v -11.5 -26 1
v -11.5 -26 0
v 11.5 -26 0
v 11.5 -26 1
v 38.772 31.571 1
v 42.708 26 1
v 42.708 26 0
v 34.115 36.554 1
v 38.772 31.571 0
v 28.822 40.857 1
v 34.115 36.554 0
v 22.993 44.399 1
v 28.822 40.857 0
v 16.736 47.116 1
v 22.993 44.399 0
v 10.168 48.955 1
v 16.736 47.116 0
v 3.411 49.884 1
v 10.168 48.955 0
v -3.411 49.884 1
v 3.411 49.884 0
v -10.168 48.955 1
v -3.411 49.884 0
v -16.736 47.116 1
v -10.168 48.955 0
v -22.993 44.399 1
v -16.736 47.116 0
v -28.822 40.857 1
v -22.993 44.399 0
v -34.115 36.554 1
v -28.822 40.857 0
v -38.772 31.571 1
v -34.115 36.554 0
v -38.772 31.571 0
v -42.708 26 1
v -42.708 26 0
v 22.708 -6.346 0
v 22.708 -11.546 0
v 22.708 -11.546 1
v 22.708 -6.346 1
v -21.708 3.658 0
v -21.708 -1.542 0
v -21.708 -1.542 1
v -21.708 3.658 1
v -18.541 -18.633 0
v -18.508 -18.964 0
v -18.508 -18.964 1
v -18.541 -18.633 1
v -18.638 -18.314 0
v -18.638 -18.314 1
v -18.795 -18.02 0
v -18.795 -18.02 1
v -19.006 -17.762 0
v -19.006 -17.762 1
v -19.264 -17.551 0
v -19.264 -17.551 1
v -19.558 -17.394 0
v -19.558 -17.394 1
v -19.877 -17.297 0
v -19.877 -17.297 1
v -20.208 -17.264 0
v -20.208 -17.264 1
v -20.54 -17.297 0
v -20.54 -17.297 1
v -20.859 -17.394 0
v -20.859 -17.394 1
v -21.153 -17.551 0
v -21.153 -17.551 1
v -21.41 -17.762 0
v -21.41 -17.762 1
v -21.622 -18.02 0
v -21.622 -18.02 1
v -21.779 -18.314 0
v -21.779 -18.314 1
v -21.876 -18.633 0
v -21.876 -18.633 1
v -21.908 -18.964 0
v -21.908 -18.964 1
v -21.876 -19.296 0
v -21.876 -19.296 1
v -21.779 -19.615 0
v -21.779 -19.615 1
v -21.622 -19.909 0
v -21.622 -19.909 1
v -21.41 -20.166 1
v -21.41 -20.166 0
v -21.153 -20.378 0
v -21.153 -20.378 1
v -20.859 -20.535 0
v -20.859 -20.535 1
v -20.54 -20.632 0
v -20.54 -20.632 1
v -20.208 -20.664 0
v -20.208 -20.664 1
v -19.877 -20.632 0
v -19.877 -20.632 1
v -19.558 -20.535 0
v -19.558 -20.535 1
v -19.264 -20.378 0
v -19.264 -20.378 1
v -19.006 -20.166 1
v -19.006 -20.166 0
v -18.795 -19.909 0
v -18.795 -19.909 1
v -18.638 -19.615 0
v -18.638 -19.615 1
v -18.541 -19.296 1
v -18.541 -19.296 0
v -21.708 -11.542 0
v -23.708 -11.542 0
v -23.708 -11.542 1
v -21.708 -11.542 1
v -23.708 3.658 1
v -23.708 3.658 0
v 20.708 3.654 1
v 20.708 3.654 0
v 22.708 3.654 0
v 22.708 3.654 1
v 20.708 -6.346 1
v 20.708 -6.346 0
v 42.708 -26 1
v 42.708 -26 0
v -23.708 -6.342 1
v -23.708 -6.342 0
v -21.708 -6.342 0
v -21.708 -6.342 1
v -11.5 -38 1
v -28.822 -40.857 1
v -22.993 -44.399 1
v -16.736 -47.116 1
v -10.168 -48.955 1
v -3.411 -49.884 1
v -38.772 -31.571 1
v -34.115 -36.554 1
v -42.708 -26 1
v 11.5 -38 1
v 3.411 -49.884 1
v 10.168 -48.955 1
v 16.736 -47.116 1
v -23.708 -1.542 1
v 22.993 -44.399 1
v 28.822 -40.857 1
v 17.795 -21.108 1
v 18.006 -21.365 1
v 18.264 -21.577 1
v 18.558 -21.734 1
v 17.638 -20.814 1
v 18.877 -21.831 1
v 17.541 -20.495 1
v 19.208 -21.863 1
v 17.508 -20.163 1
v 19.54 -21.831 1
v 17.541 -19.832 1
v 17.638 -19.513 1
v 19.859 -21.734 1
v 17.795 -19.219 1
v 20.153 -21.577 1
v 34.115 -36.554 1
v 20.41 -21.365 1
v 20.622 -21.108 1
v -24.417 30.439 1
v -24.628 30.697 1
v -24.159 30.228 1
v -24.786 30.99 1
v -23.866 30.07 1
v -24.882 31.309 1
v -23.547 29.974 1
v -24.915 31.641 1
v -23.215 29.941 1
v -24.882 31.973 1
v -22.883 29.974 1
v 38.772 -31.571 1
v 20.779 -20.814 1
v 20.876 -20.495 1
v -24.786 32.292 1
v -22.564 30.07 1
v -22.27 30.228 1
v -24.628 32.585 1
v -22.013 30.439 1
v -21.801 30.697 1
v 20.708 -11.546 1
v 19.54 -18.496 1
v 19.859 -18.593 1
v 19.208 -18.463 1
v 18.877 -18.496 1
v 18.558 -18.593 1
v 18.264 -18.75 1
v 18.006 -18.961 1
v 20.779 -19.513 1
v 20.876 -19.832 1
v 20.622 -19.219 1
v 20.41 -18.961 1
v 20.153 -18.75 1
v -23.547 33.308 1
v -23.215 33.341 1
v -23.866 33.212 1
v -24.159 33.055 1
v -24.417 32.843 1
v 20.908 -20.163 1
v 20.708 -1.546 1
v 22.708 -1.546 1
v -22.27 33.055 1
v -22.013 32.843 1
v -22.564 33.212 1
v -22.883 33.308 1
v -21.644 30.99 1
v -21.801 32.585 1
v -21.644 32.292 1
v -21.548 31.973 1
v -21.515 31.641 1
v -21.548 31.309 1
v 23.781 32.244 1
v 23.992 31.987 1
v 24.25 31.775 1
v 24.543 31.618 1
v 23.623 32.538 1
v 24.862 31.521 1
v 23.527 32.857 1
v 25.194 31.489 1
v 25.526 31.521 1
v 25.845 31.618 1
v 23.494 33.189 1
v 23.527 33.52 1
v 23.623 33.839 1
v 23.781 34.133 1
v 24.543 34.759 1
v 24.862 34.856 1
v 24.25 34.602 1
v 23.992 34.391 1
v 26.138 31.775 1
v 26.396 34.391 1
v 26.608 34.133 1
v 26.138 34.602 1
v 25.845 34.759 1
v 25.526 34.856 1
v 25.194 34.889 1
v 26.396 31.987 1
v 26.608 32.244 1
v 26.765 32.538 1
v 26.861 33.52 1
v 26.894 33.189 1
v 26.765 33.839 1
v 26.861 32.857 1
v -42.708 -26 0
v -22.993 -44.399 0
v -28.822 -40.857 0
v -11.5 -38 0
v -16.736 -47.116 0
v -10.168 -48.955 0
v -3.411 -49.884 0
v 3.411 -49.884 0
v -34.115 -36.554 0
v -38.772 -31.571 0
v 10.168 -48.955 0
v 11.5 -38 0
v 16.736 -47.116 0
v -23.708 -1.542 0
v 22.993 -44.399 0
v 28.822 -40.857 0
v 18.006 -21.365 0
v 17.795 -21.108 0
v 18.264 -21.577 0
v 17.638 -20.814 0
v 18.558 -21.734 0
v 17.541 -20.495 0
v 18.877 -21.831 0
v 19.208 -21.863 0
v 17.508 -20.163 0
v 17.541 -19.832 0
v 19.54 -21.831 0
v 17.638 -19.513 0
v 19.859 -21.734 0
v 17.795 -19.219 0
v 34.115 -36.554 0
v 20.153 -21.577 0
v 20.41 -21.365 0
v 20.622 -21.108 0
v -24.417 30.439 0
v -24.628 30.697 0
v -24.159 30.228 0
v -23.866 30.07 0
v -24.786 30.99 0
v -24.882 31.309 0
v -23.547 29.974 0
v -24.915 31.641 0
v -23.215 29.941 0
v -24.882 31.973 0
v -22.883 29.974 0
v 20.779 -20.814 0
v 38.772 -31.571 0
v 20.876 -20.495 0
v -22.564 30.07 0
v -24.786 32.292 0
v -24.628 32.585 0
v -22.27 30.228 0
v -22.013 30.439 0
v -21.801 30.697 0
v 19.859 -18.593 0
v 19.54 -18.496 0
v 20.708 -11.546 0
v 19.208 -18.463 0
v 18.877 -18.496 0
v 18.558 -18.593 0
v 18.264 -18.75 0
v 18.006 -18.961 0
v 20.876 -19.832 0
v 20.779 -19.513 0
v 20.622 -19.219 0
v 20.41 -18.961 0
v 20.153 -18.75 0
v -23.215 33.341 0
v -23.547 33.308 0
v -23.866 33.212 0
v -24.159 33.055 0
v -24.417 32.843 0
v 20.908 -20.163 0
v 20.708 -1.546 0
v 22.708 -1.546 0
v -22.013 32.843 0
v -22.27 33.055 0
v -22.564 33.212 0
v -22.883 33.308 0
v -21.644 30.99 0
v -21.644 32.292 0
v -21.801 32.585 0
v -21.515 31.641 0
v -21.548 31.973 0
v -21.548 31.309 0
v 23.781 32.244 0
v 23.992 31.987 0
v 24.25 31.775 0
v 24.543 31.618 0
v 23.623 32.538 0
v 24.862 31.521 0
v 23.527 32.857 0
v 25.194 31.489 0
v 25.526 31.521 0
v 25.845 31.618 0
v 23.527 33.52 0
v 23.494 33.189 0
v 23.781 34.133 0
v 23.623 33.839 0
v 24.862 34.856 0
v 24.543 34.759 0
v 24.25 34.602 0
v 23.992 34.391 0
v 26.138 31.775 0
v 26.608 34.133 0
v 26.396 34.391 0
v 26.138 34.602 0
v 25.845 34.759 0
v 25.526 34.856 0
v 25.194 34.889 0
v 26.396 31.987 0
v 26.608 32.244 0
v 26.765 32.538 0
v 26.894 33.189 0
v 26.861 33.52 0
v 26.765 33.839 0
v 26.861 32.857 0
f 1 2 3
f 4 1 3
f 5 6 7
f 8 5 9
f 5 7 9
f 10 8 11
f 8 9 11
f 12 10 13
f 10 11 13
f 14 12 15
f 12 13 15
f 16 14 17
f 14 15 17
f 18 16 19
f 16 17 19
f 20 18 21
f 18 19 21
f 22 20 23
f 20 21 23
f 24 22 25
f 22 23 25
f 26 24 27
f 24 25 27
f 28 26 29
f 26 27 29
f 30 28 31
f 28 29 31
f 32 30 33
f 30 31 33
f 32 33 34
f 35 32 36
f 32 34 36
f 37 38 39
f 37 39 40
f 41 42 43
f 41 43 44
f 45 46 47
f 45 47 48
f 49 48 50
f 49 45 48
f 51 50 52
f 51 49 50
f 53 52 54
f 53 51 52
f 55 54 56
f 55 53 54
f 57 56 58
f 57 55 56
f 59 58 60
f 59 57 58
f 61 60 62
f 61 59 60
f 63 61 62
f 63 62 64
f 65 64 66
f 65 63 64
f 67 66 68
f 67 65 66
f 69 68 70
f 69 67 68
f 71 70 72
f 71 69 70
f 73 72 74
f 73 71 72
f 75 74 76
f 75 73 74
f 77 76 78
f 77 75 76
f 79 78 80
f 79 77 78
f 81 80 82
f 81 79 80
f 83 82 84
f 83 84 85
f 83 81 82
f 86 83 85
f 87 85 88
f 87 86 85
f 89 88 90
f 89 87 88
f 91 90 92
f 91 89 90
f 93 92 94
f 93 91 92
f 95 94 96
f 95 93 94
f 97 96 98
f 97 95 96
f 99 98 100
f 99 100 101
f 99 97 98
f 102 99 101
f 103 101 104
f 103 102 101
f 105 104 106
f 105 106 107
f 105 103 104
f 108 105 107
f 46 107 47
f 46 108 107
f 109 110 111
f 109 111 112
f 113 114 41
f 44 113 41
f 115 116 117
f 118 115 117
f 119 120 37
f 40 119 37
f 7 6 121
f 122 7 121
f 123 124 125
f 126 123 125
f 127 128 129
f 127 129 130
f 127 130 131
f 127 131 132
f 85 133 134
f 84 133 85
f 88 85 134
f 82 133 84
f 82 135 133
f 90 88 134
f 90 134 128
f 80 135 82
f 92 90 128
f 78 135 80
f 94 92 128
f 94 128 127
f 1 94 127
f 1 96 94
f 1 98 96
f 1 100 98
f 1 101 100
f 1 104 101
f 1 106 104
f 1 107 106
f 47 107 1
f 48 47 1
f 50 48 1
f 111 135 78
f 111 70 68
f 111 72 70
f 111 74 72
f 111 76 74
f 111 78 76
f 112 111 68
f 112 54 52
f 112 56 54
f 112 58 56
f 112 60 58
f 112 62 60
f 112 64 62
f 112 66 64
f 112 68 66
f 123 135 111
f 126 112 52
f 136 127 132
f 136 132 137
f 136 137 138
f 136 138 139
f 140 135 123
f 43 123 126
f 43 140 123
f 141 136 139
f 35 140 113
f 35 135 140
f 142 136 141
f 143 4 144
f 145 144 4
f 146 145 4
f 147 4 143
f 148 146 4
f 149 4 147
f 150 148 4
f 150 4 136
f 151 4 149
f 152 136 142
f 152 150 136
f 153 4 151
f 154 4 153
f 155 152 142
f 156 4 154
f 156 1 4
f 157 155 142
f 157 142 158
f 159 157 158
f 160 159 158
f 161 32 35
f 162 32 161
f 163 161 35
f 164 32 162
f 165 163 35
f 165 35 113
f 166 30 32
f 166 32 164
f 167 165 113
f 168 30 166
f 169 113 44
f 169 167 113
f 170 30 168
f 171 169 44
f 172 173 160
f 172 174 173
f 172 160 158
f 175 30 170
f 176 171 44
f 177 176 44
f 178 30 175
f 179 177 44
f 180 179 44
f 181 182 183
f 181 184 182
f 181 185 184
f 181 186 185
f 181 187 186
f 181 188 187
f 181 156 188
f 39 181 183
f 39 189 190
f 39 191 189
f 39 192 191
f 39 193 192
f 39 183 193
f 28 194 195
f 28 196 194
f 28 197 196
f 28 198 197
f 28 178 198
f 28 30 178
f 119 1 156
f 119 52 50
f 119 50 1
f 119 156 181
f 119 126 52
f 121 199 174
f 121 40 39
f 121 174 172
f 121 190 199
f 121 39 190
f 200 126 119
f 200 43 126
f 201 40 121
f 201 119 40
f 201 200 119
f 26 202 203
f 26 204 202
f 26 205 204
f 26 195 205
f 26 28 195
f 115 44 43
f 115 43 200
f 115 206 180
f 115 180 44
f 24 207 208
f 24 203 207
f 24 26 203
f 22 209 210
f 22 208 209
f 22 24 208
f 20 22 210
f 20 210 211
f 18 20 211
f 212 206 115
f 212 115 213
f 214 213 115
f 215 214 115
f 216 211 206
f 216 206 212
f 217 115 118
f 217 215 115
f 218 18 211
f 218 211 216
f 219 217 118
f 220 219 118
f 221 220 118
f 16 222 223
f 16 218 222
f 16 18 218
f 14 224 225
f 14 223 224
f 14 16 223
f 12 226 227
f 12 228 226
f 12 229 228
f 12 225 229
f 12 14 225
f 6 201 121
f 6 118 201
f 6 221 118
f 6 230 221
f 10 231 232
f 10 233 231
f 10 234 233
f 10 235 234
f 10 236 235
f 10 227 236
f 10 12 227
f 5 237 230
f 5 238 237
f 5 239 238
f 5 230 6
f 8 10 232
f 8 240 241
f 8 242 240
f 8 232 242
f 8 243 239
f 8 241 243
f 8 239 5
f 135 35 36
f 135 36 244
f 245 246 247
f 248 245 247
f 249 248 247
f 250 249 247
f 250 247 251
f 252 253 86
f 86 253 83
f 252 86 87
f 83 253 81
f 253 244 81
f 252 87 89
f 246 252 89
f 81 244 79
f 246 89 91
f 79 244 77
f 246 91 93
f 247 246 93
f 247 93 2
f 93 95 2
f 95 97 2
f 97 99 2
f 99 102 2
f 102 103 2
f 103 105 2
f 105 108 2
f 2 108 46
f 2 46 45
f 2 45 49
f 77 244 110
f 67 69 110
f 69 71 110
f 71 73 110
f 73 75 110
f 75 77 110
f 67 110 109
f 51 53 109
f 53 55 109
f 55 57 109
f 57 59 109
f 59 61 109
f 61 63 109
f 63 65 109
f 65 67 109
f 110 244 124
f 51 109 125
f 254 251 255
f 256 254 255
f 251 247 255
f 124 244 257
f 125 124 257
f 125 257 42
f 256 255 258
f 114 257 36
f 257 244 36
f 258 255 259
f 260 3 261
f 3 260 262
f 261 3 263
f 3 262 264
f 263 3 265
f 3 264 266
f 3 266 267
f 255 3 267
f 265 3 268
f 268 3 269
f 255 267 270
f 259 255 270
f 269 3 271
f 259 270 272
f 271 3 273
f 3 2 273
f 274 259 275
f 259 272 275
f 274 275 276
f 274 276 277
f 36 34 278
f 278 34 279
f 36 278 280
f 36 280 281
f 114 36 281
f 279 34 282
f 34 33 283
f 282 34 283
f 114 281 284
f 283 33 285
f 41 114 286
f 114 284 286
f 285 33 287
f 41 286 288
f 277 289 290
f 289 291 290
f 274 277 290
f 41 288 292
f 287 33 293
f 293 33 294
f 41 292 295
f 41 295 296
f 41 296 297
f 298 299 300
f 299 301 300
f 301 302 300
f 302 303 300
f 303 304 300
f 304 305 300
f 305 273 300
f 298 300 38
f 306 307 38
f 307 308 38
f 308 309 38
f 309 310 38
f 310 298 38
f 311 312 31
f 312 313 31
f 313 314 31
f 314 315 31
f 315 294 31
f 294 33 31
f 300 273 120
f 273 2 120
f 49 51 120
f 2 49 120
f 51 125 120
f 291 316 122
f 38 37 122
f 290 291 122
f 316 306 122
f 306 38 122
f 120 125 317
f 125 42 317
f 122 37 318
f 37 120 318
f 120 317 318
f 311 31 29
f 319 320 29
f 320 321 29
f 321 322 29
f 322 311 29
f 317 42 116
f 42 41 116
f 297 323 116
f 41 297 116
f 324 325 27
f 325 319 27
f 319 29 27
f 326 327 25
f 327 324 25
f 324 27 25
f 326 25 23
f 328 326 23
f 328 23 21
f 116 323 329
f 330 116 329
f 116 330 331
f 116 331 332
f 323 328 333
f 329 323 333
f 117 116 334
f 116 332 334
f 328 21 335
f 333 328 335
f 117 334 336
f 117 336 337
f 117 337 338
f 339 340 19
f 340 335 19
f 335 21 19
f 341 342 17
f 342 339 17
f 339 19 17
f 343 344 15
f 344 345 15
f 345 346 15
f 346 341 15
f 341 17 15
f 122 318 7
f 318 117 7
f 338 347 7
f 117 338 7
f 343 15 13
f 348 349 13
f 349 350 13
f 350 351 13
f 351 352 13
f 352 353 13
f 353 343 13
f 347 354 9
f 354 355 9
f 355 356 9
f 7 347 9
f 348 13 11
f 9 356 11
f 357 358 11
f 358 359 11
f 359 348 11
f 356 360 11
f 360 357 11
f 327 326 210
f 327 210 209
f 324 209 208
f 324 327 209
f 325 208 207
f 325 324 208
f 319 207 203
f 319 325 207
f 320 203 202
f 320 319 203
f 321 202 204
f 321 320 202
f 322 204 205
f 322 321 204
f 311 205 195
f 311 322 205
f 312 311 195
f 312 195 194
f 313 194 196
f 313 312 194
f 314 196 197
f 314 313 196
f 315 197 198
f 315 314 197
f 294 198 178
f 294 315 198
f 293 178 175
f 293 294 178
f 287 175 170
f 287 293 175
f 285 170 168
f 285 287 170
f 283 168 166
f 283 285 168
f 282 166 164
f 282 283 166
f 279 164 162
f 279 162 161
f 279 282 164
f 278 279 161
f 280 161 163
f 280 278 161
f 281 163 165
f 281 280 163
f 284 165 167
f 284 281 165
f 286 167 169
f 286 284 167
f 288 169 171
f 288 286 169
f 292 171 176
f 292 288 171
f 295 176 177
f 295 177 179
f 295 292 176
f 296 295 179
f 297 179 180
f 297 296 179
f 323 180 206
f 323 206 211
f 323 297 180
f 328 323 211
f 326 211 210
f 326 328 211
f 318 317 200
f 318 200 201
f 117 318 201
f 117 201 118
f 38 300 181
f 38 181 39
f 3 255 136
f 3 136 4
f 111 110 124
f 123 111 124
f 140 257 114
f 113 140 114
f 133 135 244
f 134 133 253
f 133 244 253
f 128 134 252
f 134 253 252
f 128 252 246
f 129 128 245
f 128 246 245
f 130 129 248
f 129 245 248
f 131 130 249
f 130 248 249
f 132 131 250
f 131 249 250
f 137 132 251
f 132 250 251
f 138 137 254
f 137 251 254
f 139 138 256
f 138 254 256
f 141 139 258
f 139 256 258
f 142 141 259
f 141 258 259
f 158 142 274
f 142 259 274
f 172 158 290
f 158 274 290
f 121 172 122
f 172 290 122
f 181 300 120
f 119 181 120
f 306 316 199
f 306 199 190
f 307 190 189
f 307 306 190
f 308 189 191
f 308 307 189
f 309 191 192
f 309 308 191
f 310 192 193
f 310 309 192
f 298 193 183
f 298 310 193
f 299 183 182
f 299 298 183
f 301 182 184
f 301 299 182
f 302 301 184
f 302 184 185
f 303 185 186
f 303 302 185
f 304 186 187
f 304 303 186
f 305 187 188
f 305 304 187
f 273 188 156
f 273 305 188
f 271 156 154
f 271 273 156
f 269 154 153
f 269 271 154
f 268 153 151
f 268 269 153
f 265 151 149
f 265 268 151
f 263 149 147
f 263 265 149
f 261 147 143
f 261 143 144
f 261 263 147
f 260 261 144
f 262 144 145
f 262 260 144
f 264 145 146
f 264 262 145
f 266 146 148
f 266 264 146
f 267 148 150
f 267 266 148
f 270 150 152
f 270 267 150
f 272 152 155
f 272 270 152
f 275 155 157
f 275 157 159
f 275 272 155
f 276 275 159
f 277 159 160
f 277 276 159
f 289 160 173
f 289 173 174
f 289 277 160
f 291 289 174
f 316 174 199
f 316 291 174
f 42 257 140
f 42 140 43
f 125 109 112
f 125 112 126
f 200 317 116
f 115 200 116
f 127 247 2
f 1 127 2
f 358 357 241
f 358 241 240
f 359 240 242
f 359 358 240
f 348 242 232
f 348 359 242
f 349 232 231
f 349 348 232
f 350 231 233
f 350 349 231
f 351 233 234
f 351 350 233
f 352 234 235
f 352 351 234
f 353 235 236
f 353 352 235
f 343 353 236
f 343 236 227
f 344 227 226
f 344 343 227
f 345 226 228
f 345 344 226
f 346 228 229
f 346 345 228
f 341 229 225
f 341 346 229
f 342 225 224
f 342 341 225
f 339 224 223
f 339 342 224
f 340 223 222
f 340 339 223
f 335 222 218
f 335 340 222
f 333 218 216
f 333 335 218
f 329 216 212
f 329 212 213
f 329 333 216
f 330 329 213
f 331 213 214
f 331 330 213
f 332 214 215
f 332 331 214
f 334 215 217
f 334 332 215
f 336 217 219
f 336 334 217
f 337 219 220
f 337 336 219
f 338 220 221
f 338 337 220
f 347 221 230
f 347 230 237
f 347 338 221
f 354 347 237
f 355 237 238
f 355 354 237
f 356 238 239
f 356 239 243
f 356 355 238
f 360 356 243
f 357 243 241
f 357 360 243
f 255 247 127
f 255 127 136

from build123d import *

# Parameters (mm, degrees)
SKETCH_R     = 50
SKETCH_R_2   = 1.7
SKETCH_W     = 23
SKETCH_H     = 12
SKETCH_W_2   = 2
SKETCH_H_2   = 5.2
PAD_DEPTH    = 1
POCKET_DEPTH = 1.001


with BuildPart() as part:
    # Sketch → Pad (new body)
    with BuildSketch(Plane.XY):
        Circle(SKETCH_R)
        with Locations((-20.208313, -18.964277)):
            Circle(SKETCH_R_2, mode=Mode.SUBTRACT)
        with Locations((19.208313, -20.163197)):
            Circle(SKETCH_R_2, mode=Mode.SUBTRACT)
        with Locations((-23.214944, 31.641004)):
            Circle(SKETCH_R_2, mode=Mode.SUBTRACT)
        with Locations((25.194012, 33.188677)):
            Circle(SKETCH_R_2, mode=Mode.SUBTRACT)
        with Locations((0, -32)):
            Rectangle(SKETCH_W, SKETCH_H, mode=Mode.SUBTRACT)
        with Locations((21.708313, 1.054153)):
            Rectangle(SKETCH_W_2, SKETCH_H_2, mode=Mode.SUBTRACT)
        with Locations((21.708313, -8.945847)):
            Rectangle(SKETCH_W_2, SKETCH_H_2, mode=Mode.SUBTRACT)
        with Locations((-22.708313, -8.941766)):
            Rectangle(SKETCH_W_2, SKETCH_H_2, mode=Mode.SUBTRACT)
        with Locations((-22.708313, 1.058234)):
            Rectangle(SKETCH_W_2, SKETCH_H_2, mode=Mode.SUBTRACT)
    extrude(amount=PAD_DEPTH)

    # Sketch001 (on Face27 of Pad) → Pocket (cut, through all)
    with BuildSketch(Plane.XY.offset(1)):
        with BuildLine():
            Line((-42.708313, 26), (-42.708313, -26))
            ThreePointArc((-42.708313, 26), (-68.708313, 0), (-42.708313, -26))
        make_face()
        with BuildLine():
            Line((42.708313, 26), (42.708313, -26))
            ThreePointArc((42.708313, -26), (68.708313, 0), (42.708313, 26))
        make_face()
    extrude(amount=-POCKET_DEPTH, mode=Mode.SUBTRACT)


solid = part.part
